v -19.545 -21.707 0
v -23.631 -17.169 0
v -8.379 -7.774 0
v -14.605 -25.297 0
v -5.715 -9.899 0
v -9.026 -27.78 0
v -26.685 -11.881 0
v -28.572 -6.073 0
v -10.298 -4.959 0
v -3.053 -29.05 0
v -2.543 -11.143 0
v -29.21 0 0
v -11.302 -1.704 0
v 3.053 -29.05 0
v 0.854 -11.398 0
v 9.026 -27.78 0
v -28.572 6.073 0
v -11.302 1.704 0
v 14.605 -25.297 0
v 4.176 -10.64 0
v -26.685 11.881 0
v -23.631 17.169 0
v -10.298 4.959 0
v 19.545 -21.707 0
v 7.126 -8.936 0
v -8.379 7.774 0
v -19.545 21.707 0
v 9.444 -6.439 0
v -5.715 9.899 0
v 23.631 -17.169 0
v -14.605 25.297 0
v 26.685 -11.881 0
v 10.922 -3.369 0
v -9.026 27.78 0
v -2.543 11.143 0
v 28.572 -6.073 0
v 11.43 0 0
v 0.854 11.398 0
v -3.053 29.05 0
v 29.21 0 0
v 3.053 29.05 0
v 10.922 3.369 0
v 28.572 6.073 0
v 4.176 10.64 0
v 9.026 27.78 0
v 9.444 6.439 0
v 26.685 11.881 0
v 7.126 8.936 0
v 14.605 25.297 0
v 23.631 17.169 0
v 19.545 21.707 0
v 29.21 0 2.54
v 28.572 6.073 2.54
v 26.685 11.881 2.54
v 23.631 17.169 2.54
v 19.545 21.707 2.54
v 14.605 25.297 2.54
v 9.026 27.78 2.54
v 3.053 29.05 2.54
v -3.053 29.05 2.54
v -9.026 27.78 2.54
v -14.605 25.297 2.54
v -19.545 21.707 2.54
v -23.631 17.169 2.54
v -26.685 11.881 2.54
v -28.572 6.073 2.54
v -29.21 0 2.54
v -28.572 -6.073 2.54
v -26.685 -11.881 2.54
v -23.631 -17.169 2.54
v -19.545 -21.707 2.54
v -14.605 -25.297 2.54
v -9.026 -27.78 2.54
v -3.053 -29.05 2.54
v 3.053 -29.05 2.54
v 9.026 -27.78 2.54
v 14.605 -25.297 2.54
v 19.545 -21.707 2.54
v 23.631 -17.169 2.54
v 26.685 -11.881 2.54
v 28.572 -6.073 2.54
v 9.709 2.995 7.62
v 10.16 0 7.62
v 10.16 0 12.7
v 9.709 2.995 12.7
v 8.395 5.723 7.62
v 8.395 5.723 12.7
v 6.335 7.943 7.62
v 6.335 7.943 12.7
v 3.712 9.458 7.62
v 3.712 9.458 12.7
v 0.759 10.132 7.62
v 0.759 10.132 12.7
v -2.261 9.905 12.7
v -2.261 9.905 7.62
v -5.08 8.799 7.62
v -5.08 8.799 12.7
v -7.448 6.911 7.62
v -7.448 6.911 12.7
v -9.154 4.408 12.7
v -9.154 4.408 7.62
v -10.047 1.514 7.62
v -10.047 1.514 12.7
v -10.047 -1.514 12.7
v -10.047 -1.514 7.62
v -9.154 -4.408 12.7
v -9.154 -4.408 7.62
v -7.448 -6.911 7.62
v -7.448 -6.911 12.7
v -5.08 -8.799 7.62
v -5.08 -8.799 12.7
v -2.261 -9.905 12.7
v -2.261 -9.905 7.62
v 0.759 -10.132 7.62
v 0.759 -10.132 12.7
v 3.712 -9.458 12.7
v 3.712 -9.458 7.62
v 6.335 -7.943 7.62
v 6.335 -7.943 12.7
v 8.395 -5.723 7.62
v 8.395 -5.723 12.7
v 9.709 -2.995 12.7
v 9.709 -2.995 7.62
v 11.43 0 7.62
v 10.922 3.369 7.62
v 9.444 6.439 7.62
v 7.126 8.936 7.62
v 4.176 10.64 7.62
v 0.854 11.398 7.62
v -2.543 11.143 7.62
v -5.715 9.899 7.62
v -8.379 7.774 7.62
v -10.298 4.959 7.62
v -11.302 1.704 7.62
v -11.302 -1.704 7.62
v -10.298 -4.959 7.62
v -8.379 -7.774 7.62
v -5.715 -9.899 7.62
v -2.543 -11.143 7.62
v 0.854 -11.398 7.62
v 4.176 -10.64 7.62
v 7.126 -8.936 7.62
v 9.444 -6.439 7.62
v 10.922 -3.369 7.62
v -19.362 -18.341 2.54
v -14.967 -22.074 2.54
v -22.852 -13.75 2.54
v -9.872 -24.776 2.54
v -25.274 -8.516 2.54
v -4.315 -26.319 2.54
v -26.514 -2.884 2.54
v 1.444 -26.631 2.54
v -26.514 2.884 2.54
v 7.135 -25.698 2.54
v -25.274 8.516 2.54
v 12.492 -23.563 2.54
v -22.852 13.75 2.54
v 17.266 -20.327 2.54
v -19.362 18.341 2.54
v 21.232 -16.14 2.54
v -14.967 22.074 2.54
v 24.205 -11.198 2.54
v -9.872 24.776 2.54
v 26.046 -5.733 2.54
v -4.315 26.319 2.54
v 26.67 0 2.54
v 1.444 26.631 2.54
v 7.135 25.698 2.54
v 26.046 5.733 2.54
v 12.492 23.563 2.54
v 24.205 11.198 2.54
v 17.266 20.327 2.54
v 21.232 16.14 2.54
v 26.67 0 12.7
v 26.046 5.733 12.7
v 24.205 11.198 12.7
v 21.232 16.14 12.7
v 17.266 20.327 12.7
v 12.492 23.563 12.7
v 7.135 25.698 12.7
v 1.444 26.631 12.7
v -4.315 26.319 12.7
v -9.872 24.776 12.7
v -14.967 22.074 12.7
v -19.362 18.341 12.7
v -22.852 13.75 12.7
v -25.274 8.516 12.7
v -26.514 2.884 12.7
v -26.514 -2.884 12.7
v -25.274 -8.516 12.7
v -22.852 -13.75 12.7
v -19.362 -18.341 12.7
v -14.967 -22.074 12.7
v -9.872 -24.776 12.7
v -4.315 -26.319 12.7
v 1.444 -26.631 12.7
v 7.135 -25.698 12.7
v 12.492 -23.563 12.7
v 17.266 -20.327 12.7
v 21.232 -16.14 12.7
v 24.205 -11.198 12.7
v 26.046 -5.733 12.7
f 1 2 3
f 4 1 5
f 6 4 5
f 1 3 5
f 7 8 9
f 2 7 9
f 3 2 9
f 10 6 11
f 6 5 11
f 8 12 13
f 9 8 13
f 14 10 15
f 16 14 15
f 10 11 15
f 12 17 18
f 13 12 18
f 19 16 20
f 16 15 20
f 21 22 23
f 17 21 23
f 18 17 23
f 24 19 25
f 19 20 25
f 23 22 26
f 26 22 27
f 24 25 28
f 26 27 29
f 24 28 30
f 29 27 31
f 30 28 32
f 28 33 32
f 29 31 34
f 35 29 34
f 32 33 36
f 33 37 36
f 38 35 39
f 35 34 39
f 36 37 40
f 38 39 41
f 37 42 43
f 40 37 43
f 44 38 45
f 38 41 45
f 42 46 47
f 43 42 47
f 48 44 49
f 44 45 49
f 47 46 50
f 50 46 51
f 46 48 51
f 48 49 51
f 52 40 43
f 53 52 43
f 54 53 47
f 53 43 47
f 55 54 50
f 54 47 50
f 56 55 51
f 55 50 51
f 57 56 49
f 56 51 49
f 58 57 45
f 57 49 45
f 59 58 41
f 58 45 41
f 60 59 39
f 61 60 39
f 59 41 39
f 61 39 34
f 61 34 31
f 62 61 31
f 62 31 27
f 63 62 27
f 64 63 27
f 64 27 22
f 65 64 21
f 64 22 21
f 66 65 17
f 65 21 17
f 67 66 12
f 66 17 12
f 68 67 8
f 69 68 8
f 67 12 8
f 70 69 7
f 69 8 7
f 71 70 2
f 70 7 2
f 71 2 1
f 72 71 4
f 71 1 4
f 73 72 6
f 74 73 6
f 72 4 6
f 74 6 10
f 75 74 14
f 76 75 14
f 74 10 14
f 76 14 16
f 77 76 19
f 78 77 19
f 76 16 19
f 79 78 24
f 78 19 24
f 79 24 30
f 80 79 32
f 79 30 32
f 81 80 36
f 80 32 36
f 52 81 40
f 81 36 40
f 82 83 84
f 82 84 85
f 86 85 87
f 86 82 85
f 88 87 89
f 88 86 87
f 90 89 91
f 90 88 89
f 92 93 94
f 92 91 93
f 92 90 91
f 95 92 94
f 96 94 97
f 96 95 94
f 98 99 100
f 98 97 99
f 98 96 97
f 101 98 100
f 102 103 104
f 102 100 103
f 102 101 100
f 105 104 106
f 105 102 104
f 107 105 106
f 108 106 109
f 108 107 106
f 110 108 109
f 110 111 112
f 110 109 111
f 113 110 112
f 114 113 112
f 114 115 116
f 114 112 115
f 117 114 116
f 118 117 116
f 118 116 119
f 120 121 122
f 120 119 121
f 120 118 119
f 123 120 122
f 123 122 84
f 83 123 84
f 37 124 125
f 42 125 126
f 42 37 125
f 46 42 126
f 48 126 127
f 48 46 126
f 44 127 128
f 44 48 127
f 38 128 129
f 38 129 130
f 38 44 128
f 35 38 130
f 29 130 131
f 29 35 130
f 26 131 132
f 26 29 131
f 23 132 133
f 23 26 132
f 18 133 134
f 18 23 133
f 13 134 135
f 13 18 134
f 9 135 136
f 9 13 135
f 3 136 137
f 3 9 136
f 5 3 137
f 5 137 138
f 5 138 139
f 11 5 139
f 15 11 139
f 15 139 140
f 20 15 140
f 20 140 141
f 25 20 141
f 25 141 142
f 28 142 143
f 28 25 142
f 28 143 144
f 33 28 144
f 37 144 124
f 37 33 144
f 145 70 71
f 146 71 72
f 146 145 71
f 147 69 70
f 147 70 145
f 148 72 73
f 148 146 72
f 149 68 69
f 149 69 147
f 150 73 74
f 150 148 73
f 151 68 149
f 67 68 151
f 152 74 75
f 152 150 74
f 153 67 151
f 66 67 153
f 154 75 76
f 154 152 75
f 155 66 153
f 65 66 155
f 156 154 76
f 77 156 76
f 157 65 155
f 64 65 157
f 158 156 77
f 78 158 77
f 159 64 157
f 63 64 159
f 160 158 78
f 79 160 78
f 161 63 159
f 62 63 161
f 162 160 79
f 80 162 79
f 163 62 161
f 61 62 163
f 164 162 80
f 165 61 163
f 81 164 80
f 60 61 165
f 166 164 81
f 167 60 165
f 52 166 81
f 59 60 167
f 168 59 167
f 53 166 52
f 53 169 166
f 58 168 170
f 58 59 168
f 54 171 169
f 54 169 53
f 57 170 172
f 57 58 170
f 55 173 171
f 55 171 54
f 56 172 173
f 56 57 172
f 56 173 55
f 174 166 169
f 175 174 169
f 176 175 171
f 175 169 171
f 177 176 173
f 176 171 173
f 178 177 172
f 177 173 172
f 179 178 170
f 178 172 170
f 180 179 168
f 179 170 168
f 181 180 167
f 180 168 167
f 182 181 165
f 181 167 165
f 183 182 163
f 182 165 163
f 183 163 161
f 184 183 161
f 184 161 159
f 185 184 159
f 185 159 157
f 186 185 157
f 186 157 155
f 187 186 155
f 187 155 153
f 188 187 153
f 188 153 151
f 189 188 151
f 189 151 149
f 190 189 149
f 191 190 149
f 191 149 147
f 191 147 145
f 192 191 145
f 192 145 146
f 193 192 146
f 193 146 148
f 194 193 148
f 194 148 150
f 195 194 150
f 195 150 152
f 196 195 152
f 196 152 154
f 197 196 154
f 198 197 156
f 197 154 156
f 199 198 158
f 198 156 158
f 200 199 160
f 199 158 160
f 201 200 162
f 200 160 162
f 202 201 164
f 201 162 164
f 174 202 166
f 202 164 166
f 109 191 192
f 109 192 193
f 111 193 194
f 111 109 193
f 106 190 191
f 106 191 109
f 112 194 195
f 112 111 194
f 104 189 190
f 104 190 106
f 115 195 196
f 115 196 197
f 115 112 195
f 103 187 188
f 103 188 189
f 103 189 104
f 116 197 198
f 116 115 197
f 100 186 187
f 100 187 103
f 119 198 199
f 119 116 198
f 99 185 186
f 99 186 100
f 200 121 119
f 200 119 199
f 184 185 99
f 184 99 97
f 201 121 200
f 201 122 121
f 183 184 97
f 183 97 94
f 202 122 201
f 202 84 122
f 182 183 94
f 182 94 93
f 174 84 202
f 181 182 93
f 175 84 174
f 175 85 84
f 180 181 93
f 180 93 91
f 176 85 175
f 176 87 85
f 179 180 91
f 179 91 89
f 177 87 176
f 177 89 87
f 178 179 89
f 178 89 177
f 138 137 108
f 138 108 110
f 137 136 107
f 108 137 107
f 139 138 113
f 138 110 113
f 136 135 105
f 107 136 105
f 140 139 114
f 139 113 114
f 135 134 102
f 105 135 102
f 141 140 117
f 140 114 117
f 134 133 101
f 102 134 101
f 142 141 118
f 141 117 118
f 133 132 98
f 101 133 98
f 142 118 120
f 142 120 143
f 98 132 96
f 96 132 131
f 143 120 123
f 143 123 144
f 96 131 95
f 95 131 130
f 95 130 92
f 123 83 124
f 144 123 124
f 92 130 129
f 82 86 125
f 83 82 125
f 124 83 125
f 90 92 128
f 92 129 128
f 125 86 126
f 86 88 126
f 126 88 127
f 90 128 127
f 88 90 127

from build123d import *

# Parameters (mm, degrees)
F0_R     = 29.21
F1_DEPTH = 2.54
F2_R     = 26.67
F3_DEPTH = 12.7
F4_R     = 10.16
F5_DEPTH = 12.701
F6_R     = 11.43
F7_DEPTH = 7.62


with BuildPart() as f1:
    # F0 (on Top) → F1 (new body)
    with BuildSketch(Plane.XY):
        Circle(F0_R)
    extrude(amount=F1_DEPTH)

    # F2 (on Top) → F3 (join)
    with BuildSketch(Plane.XY):
        Circle(F2_R)
    extrude(amount=F3_DEPTH)

    # F4 (on Top) → F5 (cut, through all)
    with BuildSketch(Plane.XY):
        Circle(F4_R)
    extrude(amount=F5_DEPTH, mode=Mode.SUBTRACT)

    # F6 (on Top) → F7 (cut)
    with BuildSketch(Plane.XY):
        Circle(F6_R)
    extrude(amount=F7_DEPTH, mode=Mode.SUBTRACT)


solid = f1.part
